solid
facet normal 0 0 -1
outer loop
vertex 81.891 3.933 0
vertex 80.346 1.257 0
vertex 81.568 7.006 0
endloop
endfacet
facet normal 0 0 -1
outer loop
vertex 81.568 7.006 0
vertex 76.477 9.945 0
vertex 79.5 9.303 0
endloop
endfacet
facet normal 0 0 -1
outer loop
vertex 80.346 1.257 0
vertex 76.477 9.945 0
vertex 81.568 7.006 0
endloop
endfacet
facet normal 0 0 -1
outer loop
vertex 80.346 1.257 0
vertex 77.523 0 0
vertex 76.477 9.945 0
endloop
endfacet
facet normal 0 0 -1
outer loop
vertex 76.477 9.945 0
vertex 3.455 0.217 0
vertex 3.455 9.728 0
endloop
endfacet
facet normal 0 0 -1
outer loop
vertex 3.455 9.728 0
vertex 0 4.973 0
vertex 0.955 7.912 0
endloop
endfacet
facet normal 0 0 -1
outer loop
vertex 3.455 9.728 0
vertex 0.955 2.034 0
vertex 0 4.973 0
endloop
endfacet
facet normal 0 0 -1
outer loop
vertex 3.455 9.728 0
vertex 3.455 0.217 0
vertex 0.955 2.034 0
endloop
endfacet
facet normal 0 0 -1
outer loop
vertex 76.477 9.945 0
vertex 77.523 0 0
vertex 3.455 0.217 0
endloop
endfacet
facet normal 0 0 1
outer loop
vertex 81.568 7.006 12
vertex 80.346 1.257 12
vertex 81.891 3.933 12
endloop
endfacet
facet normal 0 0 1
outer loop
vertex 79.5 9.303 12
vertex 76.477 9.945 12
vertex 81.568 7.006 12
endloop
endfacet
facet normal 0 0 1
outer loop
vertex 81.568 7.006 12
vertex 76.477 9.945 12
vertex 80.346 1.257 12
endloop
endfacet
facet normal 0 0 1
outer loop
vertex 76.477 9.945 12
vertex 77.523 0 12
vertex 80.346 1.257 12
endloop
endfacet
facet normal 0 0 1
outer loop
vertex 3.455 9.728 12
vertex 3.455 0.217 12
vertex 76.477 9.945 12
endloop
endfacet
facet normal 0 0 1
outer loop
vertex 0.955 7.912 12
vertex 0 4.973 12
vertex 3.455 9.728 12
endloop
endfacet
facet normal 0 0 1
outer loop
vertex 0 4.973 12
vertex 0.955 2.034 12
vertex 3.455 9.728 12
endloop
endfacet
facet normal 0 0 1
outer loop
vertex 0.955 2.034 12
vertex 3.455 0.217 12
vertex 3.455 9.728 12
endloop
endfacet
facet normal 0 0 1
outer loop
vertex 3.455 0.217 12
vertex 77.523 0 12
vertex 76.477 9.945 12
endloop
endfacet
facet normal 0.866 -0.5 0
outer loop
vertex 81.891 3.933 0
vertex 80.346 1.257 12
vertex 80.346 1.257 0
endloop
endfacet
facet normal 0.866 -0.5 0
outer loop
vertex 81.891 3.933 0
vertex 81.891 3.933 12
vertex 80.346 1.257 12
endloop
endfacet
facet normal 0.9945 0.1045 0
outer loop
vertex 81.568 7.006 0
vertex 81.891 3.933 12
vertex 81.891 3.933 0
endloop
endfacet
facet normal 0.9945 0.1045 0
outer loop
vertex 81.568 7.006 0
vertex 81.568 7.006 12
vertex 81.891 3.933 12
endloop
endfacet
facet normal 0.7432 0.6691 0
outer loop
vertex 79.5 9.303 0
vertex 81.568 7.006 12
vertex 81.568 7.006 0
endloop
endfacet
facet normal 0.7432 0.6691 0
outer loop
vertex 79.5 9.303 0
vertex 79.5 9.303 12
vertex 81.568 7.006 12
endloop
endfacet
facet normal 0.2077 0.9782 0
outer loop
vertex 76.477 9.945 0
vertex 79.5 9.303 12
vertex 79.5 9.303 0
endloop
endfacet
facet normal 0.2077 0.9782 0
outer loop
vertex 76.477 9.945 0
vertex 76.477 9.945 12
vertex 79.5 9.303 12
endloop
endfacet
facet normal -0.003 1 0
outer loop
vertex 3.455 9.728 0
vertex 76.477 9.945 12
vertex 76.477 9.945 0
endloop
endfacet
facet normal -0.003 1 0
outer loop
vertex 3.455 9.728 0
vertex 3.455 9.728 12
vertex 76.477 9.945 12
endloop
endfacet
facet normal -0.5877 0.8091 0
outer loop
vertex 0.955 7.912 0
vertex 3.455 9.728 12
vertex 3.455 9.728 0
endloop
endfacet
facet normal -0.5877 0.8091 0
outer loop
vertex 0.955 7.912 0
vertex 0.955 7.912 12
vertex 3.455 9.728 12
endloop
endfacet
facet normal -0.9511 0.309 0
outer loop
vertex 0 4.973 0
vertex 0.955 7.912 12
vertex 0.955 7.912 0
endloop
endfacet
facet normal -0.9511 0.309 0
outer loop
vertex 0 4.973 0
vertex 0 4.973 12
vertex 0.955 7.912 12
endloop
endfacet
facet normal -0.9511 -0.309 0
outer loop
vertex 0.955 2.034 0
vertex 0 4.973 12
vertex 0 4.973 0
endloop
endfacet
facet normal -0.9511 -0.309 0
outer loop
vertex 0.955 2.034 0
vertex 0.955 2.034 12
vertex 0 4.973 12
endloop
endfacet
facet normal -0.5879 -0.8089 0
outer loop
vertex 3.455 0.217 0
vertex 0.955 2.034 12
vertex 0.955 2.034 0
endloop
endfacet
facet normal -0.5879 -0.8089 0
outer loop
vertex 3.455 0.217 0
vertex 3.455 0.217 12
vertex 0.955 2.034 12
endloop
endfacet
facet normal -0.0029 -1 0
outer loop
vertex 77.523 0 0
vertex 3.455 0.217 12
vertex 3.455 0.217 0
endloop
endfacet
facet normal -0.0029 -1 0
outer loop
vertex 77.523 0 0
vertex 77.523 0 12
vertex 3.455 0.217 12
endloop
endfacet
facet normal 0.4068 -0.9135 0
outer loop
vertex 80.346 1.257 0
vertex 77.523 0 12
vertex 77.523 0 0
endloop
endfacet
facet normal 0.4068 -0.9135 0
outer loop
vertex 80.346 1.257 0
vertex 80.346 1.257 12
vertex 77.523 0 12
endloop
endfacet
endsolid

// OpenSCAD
$fn = 32;

// ----------------------------------------------------------------------
// Lever arm: two bosses 10 and 8 mm, 45 mm between centres
// ----------------------------------------------------------------------

// --- parameters (mm) ---
profile_height = 12;      // extrusion height
profile_points = 11;      // points of the closed outline

profile = [[0, 4.973], [0.955, 2.034], [3.455, 0.217], [77.523, 0], [80.346, 1.257], [81.891, 3.933], [81.568, 7.006], [79.5, 9.303], [76.477, 9.945], [3.455, 9.728], [0.955, 7.912]];  // single closed polygon, 11 points, counter clockwise

// --- the one profile operation ---
linear_extrude(height = profile_height) polygon(points = profile);
